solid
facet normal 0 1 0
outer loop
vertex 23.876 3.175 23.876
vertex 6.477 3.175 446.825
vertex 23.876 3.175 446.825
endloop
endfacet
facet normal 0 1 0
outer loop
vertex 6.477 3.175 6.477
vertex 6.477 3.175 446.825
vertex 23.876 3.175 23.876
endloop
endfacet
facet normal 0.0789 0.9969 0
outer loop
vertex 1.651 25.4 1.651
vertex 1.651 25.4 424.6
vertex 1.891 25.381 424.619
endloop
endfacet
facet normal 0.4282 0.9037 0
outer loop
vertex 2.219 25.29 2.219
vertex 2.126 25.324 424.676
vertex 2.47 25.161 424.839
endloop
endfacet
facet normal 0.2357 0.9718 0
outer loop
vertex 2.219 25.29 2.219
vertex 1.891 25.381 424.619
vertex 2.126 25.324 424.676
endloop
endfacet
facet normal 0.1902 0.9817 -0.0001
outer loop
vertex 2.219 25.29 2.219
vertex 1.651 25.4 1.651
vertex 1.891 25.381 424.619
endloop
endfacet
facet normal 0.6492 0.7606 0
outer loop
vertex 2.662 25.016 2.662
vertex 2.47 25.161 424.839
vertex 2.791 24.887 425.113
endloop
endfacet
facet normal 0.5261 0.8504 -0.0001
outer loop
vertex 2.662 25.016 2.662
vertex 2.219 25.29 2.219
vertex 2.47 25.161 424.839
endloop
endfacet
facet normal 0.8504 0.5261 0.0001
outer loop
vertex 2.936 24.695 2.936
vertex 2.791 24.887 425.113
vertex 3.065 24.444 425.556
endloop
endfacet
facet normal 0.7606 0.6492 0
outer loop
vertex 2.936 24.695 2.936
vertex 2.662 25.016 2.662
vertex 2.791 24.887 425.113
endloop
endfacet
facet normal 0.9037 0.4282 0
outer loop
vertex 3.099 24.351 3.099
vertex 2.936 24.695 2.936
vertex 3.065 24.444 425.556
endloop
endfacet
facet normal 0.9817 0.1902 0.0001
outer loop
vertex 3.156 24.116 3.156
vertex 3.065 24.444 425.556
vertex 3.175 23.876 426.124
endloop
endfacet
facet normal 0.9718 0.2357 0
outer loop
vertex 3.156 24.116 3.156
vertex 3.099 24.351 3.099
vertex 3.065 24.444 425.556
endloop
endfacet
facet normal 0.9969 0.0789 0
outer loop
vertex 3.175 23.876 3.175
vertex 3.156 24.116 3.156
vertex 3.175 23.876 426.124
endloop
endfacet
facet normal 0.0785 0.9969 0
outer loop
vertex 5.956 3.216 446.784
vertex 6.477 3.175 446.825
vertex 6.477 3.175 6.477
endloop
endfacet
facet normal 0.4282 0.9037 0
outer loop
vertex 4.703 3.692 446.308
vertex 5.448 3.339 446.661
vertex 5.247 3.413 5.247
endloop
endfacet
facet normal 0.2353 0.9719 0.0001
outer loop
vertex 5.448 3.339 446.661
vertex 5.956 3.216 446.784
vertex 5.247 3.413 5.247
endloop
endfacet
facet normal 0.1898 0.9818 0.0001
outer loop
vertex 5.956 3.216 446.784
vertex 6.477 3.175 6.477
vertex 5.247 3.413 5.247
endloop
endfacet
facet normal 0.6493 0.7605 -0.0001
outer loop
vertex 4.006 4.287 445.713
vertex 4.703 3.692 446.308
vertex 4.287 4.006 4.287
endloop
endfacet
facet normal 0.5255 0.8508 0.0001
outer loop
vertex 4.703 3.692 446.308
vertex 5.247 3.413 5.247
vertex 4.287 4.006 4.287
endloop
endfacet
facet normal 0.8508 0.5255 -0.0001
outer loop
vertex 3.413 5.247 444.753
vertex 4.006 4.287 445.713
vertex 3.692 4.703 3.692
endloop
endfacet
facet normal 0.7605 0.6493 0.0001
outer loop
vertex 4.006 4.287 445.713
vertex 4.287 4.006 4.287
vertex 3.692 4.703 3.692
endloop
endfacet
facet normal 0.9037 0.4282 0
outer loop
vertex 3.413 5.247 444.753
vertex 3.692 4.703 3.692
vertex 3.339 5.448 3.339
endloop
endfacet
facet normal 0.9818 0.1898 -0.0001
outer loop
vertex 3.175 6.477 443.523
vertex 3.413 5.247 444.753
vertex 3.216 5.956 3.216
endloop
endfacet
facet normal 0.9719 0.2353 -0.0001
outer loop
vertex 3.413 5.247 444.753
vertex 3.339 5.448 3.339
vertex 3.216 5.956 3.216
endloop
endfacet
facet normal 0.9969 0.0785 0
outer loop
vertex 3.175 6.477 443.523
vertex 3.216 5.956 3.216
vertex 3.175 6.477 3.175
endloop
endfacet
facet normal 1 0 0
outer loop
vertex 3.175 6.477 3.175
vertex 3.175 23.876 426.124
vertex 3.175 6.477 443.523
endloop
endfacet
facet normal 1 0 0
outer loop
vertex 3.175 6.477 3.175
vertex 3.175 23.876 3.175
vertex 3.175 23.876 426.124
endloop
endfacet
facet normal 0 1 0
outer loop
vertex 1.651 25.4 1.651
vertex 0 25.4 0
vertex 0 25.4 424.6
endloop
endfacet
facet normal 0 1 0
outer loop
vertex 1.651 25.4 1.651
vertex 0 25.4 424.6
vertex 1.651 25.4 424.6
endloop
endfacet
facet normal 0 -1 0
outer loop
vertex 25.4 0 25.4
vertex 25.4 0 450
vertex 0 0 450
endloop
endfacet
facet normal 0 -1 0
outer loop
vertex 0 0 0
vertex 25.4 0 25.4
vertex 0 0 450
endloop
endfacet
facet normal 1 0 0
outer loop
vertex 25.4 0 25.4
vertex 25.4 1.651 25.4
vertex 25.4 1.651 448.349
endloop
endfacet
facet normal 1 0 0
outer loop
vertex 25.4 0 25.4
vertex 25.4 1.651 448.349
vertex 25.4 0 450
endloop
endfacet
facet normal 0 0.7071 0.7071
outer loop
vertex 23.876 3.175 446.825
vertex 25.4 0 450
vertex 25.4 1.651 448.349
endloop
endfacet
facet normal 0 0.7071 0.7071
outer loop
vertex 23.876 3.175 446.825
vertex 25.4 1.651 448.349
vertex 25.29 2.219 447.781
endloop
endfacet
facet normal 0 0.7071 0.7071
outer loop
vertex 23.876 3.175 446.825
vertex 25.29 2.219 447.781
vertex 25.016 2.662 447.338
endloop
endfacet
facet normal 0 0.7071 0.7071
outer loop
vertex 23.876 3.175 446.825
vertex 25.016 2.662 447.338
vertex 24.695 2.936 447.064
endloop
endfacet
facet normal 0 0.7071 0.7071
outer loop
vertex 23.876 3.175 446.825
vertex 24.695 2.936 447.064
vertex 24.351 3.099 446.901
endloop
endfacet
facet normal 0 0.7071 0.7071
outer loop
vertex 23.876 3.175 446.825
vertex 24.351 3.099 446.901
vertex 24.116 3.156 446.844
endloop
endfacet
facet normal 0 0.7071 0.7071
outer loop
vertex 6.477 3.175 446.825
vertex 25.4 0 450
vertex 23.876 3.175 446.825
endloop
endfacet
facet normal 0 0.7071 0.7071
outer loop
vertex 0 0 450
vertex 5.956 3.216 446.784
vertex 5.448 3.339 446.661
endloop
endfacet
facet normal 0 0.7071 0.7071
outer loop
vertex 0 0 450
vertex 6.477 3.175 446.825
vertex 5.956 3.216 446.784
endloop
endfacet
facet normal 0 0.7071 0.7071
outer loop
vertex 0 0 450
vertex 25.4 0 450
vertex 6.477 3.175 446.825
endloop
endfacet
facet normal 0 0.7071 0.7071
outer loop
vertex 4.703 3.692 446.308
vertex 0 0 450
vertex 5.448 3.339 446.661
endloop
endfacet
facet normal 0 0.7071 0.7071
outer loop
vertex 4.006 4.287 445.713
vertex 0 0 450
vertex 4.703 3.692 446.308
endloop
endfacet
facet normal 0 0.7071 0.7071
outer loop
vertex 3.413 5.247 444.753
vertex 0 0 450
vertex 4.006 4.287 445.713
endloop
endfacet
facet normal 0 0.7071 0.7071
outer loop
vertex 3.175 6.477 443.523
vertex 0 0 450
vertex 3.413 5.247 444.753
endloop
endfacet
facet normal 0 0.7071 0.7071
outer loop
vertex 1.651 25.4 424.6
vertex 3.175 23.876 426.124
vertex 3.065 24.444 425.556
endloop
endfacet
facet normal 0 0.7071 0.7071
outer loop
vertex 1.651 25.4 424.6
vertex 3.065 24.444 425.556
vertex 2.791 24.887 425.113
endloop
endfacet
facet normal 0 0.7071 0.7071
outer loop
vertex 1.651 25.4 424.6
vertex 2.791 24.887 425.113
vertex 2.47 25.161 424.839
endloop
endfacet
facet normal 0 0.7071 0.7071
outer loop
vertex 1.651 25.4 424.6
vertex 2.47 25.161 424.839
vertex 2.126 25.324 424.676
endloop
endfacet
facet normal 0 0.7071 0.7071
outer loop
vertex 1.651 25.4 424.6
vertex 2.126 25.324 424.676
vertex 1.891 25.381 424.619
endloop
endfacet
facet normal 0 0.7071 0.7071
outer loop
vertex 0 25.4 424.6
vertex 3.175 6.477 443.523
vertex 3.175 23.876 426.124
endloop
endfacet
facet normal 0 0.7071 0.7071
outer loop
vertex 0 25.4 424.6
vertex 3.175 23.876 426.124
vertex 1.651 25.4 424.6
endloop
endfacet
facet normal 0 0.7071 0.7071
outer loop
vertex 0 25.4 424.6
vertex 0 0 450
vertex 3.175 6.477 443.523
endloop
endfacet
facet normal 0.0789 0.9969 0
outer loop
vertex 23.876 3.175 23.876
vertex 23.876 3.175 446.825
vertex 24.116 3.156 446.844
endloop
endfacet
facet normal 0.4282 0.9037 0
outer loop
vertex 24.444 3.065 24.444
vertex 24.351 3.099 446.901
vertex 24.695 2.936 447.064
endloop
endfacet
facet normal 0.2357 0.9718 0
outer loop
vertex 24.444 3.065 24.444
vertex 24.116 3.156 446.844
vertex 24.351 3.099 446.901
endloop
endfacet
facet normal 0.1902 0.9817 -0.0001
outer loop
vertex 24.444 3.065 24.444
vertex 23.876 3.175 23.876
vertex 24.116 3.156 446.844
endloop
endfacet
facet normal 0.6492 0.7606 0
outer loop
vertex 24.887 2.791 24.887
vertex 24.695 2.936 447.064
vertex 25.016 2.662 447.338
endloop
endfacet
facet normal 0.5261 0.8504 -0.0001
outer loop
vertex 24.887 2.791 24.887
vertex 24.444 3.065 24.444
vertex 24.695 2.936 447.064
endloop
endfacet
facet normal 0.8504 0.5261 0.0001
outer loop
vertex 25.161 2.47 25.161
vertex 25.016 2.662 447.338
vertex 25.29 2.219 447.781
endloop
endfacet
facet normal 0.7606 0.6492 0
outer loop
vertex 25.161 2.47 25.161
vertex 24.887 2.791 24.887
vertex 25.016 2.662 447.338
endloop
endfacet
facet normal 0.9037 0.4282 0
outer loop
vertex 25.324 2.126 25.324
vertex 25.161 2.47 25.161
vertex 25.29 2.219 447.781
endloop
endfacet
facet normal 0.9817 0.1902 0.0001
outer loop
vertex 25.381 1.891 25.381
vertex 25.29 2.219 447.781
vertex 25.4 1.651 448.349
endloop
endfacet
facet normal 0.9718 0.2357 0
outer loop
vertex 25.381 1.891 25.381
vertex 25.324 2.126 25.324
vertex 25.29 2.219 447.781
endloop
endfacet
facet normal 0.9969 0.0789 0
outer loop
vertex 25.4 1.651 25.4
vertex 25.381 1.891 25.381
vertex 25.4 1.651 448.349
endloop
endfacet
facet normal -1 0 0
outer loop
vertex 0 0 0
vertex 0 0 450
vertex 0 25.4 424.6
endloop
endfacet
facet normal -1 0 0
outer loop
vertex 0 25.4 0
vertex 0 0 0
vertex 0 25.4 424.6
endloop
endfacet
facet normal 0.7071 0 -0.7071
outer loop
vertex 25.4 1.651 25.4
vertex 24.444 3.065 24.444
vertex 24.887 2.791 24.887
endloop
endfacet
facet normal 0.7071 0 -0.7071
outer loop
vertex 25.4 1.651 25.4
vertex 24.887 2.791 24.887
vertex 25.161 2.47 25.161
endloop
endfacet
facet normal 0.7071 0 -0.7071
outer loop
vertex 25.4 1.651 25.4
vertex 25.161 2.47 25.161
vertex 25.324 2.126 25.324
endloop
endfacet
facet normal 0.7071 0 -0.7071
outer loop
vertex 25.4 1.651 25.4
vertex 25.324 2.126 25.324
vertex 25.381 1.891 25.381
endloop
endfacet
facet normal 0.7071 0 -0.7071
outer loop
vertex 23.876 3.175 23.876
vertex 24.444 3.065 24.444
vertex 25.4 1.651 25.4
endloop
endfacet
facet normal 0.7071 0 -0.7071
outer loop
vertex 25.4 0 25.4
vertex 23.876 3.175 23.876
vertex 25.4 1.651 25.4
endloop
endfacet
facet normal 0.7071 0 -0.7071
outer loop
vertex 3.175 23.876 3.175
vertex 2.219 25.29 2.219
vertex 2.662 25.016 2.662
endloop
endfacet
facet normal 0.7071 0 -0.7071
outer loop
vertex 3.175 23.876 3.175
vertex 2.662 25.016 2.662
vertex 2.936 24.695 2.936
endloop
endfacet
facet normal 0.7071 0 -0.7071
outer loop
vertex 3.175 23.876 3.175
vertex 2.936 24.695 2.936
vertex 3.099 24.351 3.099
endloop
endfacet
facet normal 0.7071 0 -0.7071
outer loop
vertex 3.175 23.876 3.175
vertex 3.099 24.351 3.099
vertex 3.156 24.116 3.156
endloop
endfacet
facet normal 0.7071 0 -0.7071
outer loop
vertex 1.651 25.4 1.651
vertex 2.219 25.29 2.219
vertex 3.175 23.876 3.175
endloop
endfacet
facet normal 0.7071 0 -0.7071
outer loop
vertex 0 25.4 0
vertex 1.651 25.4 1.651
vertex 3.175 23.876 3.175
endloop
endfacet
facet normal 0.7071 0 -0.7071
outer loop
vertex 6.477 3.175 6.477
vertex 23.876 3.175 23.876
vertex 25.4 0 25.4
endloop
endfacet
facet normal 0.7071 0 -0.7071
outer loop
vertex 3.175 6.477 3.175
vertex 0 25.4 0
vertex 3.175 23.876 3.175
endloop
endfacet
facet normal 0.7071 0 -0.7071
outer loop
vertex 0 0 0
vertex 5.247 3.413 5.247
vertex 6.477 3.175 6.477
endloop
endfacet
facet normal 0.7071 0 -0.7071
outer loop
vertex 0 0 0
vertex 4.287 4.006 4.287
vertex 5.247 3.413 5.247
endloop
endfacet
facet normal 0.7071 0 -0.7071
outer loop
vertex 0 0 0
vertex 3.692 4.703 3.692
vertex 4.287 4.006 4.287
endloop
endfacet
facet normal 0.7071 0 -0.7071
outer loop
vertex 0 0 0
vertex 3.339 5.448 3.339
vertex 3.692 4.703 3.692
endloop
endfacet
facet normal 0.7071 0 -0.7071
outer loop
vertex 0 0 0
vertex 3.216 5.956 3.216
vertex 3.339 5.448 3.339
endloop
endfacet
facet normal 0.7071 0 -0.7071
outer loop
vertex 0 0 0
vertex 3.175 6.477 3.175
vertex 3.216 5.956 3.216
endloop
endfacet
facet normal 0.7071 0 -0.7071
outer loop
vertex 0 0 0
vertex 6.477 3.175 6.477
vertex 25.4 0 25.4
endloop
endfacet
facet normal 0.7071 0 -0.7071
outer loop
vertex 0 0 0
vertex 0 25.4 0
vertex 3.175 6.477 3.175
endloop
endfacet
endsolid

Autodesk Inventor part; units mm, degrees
ref_plane "Start Plane" through (0, 0, 0) normal (0, 0, 1) x (1, 0, 0)
ref_plane "End Plane" through (0, 0, 450) normal (0, 0, 1) x (1, 0, 0)
sketch "Sketch" plane through (0, 0, 0) normal (0, 0, 1) x (1, 0, 0)
  line L0 (25.4, 0) -> (0, 0)
  line L1 (0, 0) -> (0, 25.4)
  line L2 (0, 25.4) -> (1.651, 25.4)
  line L3 (3.175, 23.876) -> (3.175, 6.477)
  line L4 (6.477, 3.175) -> (23.876, 3.175)
  line L5 (25.4, 1.651) -> (25.4, 0)
  line L6 (0, -11.0414) -> (0, 31.5385) construction
  line L7 (-11.0414, 0) -> (31.5385, 0) construction
  arc A0 (3.175, 6.477) -> (6.477, 3.175) centre (6.477, 6.477) ccw
  arc A1 (3.175, 23.876) -> (1.651, 25.4) centre (1.651, 23.876) ccw
  arc A2 (25.4, 1.651) -> (23.876, 3.175) centre (23.876, 1.651) ccw
  line L8 (0, 40.0545) -> (0, -19.5574) construction
  line L9 (-19.5574, 0) -> (40.0545, 0) construction
  point P0 (3.175, 25.4)
  point P1 (3.175, 3.175)
  point P2 (25.4, 3.175)
  dimension "d0" = 25.4
  dimension "d1" = 25.4
  dimension "d2" = 3.175
  dimension "d3" = 3.175
  dimension "d10" = 0
  dimension "d11" = 0
  dimension "d14" = 3.302
  dimension "d15" = 1.524
extrude "Body" add sketch "Sketch" along normal up to surface (450 mm away) from surface at 0
sketch "Sketch3" plane through (0, 0, 0) normal (0, 0, 1) x (1, 0, 0)
  line L0 (0, 0) -> (10, 0)
ref_plane "Work Plane3" through (0, 0, 0) normal (0, -1, 0) x (1, 0, 0)
ref_plane "Work Plane5" through (12.7, 0, 450) normal (0, 0.7071, 0.7071) x (1, 0, 0)
split "Split2" plane through (12.7, 0, 450) removes the side toward (0, 0.7071, 0.7071)
ref_plane "Work Plane6" through (0, 12.7, 0) normal (0.7071, 0, -0.7071) x (-0.7071, 0, -0.7071)
split "Split3" plane through (0, 12.7, 0) removes the side toward (0.7071, 0, -0.7071)
sketch "Sketch4" plane through (0, 0, 0) normal (0, -1, 0) x (1, 0, 0)
  line L0 (-2, 0) -> (12, 0) projected
  line L1 (-2, 450) -> (12, 450) projected
  dimension "d17" = 450
equation "\"d0\" = G_H"
equation "\"d1\" = G_H"
equation "\"d2\" = G_T"
equation "\"d3\" = G_T"
equation "\"d14\" = G_IR"
equation "\"d15\" = G_ER"
equation "\"d4\" = G_L"
equation "\"G_H\" = 25.4"
equation "\"G_T\" = 3.175"
equation "\"G_ER\" = 1.524"
equation "\"G_IR\" = 3.302"
equation "\"G_L\" = d17"
equation "\"ex\" = 0"
equation "\"G_OFFSET_START\" = 0"
equation "\"G_OFFSET_END\" = 0"
equation "\"d13\" = G_OFFSET_END + B_L"
equation "\"B_L\" = 450"
properties part number "AISC - L 1 x 1 x 1/8 - 17.717" material "Steel, Mild"
